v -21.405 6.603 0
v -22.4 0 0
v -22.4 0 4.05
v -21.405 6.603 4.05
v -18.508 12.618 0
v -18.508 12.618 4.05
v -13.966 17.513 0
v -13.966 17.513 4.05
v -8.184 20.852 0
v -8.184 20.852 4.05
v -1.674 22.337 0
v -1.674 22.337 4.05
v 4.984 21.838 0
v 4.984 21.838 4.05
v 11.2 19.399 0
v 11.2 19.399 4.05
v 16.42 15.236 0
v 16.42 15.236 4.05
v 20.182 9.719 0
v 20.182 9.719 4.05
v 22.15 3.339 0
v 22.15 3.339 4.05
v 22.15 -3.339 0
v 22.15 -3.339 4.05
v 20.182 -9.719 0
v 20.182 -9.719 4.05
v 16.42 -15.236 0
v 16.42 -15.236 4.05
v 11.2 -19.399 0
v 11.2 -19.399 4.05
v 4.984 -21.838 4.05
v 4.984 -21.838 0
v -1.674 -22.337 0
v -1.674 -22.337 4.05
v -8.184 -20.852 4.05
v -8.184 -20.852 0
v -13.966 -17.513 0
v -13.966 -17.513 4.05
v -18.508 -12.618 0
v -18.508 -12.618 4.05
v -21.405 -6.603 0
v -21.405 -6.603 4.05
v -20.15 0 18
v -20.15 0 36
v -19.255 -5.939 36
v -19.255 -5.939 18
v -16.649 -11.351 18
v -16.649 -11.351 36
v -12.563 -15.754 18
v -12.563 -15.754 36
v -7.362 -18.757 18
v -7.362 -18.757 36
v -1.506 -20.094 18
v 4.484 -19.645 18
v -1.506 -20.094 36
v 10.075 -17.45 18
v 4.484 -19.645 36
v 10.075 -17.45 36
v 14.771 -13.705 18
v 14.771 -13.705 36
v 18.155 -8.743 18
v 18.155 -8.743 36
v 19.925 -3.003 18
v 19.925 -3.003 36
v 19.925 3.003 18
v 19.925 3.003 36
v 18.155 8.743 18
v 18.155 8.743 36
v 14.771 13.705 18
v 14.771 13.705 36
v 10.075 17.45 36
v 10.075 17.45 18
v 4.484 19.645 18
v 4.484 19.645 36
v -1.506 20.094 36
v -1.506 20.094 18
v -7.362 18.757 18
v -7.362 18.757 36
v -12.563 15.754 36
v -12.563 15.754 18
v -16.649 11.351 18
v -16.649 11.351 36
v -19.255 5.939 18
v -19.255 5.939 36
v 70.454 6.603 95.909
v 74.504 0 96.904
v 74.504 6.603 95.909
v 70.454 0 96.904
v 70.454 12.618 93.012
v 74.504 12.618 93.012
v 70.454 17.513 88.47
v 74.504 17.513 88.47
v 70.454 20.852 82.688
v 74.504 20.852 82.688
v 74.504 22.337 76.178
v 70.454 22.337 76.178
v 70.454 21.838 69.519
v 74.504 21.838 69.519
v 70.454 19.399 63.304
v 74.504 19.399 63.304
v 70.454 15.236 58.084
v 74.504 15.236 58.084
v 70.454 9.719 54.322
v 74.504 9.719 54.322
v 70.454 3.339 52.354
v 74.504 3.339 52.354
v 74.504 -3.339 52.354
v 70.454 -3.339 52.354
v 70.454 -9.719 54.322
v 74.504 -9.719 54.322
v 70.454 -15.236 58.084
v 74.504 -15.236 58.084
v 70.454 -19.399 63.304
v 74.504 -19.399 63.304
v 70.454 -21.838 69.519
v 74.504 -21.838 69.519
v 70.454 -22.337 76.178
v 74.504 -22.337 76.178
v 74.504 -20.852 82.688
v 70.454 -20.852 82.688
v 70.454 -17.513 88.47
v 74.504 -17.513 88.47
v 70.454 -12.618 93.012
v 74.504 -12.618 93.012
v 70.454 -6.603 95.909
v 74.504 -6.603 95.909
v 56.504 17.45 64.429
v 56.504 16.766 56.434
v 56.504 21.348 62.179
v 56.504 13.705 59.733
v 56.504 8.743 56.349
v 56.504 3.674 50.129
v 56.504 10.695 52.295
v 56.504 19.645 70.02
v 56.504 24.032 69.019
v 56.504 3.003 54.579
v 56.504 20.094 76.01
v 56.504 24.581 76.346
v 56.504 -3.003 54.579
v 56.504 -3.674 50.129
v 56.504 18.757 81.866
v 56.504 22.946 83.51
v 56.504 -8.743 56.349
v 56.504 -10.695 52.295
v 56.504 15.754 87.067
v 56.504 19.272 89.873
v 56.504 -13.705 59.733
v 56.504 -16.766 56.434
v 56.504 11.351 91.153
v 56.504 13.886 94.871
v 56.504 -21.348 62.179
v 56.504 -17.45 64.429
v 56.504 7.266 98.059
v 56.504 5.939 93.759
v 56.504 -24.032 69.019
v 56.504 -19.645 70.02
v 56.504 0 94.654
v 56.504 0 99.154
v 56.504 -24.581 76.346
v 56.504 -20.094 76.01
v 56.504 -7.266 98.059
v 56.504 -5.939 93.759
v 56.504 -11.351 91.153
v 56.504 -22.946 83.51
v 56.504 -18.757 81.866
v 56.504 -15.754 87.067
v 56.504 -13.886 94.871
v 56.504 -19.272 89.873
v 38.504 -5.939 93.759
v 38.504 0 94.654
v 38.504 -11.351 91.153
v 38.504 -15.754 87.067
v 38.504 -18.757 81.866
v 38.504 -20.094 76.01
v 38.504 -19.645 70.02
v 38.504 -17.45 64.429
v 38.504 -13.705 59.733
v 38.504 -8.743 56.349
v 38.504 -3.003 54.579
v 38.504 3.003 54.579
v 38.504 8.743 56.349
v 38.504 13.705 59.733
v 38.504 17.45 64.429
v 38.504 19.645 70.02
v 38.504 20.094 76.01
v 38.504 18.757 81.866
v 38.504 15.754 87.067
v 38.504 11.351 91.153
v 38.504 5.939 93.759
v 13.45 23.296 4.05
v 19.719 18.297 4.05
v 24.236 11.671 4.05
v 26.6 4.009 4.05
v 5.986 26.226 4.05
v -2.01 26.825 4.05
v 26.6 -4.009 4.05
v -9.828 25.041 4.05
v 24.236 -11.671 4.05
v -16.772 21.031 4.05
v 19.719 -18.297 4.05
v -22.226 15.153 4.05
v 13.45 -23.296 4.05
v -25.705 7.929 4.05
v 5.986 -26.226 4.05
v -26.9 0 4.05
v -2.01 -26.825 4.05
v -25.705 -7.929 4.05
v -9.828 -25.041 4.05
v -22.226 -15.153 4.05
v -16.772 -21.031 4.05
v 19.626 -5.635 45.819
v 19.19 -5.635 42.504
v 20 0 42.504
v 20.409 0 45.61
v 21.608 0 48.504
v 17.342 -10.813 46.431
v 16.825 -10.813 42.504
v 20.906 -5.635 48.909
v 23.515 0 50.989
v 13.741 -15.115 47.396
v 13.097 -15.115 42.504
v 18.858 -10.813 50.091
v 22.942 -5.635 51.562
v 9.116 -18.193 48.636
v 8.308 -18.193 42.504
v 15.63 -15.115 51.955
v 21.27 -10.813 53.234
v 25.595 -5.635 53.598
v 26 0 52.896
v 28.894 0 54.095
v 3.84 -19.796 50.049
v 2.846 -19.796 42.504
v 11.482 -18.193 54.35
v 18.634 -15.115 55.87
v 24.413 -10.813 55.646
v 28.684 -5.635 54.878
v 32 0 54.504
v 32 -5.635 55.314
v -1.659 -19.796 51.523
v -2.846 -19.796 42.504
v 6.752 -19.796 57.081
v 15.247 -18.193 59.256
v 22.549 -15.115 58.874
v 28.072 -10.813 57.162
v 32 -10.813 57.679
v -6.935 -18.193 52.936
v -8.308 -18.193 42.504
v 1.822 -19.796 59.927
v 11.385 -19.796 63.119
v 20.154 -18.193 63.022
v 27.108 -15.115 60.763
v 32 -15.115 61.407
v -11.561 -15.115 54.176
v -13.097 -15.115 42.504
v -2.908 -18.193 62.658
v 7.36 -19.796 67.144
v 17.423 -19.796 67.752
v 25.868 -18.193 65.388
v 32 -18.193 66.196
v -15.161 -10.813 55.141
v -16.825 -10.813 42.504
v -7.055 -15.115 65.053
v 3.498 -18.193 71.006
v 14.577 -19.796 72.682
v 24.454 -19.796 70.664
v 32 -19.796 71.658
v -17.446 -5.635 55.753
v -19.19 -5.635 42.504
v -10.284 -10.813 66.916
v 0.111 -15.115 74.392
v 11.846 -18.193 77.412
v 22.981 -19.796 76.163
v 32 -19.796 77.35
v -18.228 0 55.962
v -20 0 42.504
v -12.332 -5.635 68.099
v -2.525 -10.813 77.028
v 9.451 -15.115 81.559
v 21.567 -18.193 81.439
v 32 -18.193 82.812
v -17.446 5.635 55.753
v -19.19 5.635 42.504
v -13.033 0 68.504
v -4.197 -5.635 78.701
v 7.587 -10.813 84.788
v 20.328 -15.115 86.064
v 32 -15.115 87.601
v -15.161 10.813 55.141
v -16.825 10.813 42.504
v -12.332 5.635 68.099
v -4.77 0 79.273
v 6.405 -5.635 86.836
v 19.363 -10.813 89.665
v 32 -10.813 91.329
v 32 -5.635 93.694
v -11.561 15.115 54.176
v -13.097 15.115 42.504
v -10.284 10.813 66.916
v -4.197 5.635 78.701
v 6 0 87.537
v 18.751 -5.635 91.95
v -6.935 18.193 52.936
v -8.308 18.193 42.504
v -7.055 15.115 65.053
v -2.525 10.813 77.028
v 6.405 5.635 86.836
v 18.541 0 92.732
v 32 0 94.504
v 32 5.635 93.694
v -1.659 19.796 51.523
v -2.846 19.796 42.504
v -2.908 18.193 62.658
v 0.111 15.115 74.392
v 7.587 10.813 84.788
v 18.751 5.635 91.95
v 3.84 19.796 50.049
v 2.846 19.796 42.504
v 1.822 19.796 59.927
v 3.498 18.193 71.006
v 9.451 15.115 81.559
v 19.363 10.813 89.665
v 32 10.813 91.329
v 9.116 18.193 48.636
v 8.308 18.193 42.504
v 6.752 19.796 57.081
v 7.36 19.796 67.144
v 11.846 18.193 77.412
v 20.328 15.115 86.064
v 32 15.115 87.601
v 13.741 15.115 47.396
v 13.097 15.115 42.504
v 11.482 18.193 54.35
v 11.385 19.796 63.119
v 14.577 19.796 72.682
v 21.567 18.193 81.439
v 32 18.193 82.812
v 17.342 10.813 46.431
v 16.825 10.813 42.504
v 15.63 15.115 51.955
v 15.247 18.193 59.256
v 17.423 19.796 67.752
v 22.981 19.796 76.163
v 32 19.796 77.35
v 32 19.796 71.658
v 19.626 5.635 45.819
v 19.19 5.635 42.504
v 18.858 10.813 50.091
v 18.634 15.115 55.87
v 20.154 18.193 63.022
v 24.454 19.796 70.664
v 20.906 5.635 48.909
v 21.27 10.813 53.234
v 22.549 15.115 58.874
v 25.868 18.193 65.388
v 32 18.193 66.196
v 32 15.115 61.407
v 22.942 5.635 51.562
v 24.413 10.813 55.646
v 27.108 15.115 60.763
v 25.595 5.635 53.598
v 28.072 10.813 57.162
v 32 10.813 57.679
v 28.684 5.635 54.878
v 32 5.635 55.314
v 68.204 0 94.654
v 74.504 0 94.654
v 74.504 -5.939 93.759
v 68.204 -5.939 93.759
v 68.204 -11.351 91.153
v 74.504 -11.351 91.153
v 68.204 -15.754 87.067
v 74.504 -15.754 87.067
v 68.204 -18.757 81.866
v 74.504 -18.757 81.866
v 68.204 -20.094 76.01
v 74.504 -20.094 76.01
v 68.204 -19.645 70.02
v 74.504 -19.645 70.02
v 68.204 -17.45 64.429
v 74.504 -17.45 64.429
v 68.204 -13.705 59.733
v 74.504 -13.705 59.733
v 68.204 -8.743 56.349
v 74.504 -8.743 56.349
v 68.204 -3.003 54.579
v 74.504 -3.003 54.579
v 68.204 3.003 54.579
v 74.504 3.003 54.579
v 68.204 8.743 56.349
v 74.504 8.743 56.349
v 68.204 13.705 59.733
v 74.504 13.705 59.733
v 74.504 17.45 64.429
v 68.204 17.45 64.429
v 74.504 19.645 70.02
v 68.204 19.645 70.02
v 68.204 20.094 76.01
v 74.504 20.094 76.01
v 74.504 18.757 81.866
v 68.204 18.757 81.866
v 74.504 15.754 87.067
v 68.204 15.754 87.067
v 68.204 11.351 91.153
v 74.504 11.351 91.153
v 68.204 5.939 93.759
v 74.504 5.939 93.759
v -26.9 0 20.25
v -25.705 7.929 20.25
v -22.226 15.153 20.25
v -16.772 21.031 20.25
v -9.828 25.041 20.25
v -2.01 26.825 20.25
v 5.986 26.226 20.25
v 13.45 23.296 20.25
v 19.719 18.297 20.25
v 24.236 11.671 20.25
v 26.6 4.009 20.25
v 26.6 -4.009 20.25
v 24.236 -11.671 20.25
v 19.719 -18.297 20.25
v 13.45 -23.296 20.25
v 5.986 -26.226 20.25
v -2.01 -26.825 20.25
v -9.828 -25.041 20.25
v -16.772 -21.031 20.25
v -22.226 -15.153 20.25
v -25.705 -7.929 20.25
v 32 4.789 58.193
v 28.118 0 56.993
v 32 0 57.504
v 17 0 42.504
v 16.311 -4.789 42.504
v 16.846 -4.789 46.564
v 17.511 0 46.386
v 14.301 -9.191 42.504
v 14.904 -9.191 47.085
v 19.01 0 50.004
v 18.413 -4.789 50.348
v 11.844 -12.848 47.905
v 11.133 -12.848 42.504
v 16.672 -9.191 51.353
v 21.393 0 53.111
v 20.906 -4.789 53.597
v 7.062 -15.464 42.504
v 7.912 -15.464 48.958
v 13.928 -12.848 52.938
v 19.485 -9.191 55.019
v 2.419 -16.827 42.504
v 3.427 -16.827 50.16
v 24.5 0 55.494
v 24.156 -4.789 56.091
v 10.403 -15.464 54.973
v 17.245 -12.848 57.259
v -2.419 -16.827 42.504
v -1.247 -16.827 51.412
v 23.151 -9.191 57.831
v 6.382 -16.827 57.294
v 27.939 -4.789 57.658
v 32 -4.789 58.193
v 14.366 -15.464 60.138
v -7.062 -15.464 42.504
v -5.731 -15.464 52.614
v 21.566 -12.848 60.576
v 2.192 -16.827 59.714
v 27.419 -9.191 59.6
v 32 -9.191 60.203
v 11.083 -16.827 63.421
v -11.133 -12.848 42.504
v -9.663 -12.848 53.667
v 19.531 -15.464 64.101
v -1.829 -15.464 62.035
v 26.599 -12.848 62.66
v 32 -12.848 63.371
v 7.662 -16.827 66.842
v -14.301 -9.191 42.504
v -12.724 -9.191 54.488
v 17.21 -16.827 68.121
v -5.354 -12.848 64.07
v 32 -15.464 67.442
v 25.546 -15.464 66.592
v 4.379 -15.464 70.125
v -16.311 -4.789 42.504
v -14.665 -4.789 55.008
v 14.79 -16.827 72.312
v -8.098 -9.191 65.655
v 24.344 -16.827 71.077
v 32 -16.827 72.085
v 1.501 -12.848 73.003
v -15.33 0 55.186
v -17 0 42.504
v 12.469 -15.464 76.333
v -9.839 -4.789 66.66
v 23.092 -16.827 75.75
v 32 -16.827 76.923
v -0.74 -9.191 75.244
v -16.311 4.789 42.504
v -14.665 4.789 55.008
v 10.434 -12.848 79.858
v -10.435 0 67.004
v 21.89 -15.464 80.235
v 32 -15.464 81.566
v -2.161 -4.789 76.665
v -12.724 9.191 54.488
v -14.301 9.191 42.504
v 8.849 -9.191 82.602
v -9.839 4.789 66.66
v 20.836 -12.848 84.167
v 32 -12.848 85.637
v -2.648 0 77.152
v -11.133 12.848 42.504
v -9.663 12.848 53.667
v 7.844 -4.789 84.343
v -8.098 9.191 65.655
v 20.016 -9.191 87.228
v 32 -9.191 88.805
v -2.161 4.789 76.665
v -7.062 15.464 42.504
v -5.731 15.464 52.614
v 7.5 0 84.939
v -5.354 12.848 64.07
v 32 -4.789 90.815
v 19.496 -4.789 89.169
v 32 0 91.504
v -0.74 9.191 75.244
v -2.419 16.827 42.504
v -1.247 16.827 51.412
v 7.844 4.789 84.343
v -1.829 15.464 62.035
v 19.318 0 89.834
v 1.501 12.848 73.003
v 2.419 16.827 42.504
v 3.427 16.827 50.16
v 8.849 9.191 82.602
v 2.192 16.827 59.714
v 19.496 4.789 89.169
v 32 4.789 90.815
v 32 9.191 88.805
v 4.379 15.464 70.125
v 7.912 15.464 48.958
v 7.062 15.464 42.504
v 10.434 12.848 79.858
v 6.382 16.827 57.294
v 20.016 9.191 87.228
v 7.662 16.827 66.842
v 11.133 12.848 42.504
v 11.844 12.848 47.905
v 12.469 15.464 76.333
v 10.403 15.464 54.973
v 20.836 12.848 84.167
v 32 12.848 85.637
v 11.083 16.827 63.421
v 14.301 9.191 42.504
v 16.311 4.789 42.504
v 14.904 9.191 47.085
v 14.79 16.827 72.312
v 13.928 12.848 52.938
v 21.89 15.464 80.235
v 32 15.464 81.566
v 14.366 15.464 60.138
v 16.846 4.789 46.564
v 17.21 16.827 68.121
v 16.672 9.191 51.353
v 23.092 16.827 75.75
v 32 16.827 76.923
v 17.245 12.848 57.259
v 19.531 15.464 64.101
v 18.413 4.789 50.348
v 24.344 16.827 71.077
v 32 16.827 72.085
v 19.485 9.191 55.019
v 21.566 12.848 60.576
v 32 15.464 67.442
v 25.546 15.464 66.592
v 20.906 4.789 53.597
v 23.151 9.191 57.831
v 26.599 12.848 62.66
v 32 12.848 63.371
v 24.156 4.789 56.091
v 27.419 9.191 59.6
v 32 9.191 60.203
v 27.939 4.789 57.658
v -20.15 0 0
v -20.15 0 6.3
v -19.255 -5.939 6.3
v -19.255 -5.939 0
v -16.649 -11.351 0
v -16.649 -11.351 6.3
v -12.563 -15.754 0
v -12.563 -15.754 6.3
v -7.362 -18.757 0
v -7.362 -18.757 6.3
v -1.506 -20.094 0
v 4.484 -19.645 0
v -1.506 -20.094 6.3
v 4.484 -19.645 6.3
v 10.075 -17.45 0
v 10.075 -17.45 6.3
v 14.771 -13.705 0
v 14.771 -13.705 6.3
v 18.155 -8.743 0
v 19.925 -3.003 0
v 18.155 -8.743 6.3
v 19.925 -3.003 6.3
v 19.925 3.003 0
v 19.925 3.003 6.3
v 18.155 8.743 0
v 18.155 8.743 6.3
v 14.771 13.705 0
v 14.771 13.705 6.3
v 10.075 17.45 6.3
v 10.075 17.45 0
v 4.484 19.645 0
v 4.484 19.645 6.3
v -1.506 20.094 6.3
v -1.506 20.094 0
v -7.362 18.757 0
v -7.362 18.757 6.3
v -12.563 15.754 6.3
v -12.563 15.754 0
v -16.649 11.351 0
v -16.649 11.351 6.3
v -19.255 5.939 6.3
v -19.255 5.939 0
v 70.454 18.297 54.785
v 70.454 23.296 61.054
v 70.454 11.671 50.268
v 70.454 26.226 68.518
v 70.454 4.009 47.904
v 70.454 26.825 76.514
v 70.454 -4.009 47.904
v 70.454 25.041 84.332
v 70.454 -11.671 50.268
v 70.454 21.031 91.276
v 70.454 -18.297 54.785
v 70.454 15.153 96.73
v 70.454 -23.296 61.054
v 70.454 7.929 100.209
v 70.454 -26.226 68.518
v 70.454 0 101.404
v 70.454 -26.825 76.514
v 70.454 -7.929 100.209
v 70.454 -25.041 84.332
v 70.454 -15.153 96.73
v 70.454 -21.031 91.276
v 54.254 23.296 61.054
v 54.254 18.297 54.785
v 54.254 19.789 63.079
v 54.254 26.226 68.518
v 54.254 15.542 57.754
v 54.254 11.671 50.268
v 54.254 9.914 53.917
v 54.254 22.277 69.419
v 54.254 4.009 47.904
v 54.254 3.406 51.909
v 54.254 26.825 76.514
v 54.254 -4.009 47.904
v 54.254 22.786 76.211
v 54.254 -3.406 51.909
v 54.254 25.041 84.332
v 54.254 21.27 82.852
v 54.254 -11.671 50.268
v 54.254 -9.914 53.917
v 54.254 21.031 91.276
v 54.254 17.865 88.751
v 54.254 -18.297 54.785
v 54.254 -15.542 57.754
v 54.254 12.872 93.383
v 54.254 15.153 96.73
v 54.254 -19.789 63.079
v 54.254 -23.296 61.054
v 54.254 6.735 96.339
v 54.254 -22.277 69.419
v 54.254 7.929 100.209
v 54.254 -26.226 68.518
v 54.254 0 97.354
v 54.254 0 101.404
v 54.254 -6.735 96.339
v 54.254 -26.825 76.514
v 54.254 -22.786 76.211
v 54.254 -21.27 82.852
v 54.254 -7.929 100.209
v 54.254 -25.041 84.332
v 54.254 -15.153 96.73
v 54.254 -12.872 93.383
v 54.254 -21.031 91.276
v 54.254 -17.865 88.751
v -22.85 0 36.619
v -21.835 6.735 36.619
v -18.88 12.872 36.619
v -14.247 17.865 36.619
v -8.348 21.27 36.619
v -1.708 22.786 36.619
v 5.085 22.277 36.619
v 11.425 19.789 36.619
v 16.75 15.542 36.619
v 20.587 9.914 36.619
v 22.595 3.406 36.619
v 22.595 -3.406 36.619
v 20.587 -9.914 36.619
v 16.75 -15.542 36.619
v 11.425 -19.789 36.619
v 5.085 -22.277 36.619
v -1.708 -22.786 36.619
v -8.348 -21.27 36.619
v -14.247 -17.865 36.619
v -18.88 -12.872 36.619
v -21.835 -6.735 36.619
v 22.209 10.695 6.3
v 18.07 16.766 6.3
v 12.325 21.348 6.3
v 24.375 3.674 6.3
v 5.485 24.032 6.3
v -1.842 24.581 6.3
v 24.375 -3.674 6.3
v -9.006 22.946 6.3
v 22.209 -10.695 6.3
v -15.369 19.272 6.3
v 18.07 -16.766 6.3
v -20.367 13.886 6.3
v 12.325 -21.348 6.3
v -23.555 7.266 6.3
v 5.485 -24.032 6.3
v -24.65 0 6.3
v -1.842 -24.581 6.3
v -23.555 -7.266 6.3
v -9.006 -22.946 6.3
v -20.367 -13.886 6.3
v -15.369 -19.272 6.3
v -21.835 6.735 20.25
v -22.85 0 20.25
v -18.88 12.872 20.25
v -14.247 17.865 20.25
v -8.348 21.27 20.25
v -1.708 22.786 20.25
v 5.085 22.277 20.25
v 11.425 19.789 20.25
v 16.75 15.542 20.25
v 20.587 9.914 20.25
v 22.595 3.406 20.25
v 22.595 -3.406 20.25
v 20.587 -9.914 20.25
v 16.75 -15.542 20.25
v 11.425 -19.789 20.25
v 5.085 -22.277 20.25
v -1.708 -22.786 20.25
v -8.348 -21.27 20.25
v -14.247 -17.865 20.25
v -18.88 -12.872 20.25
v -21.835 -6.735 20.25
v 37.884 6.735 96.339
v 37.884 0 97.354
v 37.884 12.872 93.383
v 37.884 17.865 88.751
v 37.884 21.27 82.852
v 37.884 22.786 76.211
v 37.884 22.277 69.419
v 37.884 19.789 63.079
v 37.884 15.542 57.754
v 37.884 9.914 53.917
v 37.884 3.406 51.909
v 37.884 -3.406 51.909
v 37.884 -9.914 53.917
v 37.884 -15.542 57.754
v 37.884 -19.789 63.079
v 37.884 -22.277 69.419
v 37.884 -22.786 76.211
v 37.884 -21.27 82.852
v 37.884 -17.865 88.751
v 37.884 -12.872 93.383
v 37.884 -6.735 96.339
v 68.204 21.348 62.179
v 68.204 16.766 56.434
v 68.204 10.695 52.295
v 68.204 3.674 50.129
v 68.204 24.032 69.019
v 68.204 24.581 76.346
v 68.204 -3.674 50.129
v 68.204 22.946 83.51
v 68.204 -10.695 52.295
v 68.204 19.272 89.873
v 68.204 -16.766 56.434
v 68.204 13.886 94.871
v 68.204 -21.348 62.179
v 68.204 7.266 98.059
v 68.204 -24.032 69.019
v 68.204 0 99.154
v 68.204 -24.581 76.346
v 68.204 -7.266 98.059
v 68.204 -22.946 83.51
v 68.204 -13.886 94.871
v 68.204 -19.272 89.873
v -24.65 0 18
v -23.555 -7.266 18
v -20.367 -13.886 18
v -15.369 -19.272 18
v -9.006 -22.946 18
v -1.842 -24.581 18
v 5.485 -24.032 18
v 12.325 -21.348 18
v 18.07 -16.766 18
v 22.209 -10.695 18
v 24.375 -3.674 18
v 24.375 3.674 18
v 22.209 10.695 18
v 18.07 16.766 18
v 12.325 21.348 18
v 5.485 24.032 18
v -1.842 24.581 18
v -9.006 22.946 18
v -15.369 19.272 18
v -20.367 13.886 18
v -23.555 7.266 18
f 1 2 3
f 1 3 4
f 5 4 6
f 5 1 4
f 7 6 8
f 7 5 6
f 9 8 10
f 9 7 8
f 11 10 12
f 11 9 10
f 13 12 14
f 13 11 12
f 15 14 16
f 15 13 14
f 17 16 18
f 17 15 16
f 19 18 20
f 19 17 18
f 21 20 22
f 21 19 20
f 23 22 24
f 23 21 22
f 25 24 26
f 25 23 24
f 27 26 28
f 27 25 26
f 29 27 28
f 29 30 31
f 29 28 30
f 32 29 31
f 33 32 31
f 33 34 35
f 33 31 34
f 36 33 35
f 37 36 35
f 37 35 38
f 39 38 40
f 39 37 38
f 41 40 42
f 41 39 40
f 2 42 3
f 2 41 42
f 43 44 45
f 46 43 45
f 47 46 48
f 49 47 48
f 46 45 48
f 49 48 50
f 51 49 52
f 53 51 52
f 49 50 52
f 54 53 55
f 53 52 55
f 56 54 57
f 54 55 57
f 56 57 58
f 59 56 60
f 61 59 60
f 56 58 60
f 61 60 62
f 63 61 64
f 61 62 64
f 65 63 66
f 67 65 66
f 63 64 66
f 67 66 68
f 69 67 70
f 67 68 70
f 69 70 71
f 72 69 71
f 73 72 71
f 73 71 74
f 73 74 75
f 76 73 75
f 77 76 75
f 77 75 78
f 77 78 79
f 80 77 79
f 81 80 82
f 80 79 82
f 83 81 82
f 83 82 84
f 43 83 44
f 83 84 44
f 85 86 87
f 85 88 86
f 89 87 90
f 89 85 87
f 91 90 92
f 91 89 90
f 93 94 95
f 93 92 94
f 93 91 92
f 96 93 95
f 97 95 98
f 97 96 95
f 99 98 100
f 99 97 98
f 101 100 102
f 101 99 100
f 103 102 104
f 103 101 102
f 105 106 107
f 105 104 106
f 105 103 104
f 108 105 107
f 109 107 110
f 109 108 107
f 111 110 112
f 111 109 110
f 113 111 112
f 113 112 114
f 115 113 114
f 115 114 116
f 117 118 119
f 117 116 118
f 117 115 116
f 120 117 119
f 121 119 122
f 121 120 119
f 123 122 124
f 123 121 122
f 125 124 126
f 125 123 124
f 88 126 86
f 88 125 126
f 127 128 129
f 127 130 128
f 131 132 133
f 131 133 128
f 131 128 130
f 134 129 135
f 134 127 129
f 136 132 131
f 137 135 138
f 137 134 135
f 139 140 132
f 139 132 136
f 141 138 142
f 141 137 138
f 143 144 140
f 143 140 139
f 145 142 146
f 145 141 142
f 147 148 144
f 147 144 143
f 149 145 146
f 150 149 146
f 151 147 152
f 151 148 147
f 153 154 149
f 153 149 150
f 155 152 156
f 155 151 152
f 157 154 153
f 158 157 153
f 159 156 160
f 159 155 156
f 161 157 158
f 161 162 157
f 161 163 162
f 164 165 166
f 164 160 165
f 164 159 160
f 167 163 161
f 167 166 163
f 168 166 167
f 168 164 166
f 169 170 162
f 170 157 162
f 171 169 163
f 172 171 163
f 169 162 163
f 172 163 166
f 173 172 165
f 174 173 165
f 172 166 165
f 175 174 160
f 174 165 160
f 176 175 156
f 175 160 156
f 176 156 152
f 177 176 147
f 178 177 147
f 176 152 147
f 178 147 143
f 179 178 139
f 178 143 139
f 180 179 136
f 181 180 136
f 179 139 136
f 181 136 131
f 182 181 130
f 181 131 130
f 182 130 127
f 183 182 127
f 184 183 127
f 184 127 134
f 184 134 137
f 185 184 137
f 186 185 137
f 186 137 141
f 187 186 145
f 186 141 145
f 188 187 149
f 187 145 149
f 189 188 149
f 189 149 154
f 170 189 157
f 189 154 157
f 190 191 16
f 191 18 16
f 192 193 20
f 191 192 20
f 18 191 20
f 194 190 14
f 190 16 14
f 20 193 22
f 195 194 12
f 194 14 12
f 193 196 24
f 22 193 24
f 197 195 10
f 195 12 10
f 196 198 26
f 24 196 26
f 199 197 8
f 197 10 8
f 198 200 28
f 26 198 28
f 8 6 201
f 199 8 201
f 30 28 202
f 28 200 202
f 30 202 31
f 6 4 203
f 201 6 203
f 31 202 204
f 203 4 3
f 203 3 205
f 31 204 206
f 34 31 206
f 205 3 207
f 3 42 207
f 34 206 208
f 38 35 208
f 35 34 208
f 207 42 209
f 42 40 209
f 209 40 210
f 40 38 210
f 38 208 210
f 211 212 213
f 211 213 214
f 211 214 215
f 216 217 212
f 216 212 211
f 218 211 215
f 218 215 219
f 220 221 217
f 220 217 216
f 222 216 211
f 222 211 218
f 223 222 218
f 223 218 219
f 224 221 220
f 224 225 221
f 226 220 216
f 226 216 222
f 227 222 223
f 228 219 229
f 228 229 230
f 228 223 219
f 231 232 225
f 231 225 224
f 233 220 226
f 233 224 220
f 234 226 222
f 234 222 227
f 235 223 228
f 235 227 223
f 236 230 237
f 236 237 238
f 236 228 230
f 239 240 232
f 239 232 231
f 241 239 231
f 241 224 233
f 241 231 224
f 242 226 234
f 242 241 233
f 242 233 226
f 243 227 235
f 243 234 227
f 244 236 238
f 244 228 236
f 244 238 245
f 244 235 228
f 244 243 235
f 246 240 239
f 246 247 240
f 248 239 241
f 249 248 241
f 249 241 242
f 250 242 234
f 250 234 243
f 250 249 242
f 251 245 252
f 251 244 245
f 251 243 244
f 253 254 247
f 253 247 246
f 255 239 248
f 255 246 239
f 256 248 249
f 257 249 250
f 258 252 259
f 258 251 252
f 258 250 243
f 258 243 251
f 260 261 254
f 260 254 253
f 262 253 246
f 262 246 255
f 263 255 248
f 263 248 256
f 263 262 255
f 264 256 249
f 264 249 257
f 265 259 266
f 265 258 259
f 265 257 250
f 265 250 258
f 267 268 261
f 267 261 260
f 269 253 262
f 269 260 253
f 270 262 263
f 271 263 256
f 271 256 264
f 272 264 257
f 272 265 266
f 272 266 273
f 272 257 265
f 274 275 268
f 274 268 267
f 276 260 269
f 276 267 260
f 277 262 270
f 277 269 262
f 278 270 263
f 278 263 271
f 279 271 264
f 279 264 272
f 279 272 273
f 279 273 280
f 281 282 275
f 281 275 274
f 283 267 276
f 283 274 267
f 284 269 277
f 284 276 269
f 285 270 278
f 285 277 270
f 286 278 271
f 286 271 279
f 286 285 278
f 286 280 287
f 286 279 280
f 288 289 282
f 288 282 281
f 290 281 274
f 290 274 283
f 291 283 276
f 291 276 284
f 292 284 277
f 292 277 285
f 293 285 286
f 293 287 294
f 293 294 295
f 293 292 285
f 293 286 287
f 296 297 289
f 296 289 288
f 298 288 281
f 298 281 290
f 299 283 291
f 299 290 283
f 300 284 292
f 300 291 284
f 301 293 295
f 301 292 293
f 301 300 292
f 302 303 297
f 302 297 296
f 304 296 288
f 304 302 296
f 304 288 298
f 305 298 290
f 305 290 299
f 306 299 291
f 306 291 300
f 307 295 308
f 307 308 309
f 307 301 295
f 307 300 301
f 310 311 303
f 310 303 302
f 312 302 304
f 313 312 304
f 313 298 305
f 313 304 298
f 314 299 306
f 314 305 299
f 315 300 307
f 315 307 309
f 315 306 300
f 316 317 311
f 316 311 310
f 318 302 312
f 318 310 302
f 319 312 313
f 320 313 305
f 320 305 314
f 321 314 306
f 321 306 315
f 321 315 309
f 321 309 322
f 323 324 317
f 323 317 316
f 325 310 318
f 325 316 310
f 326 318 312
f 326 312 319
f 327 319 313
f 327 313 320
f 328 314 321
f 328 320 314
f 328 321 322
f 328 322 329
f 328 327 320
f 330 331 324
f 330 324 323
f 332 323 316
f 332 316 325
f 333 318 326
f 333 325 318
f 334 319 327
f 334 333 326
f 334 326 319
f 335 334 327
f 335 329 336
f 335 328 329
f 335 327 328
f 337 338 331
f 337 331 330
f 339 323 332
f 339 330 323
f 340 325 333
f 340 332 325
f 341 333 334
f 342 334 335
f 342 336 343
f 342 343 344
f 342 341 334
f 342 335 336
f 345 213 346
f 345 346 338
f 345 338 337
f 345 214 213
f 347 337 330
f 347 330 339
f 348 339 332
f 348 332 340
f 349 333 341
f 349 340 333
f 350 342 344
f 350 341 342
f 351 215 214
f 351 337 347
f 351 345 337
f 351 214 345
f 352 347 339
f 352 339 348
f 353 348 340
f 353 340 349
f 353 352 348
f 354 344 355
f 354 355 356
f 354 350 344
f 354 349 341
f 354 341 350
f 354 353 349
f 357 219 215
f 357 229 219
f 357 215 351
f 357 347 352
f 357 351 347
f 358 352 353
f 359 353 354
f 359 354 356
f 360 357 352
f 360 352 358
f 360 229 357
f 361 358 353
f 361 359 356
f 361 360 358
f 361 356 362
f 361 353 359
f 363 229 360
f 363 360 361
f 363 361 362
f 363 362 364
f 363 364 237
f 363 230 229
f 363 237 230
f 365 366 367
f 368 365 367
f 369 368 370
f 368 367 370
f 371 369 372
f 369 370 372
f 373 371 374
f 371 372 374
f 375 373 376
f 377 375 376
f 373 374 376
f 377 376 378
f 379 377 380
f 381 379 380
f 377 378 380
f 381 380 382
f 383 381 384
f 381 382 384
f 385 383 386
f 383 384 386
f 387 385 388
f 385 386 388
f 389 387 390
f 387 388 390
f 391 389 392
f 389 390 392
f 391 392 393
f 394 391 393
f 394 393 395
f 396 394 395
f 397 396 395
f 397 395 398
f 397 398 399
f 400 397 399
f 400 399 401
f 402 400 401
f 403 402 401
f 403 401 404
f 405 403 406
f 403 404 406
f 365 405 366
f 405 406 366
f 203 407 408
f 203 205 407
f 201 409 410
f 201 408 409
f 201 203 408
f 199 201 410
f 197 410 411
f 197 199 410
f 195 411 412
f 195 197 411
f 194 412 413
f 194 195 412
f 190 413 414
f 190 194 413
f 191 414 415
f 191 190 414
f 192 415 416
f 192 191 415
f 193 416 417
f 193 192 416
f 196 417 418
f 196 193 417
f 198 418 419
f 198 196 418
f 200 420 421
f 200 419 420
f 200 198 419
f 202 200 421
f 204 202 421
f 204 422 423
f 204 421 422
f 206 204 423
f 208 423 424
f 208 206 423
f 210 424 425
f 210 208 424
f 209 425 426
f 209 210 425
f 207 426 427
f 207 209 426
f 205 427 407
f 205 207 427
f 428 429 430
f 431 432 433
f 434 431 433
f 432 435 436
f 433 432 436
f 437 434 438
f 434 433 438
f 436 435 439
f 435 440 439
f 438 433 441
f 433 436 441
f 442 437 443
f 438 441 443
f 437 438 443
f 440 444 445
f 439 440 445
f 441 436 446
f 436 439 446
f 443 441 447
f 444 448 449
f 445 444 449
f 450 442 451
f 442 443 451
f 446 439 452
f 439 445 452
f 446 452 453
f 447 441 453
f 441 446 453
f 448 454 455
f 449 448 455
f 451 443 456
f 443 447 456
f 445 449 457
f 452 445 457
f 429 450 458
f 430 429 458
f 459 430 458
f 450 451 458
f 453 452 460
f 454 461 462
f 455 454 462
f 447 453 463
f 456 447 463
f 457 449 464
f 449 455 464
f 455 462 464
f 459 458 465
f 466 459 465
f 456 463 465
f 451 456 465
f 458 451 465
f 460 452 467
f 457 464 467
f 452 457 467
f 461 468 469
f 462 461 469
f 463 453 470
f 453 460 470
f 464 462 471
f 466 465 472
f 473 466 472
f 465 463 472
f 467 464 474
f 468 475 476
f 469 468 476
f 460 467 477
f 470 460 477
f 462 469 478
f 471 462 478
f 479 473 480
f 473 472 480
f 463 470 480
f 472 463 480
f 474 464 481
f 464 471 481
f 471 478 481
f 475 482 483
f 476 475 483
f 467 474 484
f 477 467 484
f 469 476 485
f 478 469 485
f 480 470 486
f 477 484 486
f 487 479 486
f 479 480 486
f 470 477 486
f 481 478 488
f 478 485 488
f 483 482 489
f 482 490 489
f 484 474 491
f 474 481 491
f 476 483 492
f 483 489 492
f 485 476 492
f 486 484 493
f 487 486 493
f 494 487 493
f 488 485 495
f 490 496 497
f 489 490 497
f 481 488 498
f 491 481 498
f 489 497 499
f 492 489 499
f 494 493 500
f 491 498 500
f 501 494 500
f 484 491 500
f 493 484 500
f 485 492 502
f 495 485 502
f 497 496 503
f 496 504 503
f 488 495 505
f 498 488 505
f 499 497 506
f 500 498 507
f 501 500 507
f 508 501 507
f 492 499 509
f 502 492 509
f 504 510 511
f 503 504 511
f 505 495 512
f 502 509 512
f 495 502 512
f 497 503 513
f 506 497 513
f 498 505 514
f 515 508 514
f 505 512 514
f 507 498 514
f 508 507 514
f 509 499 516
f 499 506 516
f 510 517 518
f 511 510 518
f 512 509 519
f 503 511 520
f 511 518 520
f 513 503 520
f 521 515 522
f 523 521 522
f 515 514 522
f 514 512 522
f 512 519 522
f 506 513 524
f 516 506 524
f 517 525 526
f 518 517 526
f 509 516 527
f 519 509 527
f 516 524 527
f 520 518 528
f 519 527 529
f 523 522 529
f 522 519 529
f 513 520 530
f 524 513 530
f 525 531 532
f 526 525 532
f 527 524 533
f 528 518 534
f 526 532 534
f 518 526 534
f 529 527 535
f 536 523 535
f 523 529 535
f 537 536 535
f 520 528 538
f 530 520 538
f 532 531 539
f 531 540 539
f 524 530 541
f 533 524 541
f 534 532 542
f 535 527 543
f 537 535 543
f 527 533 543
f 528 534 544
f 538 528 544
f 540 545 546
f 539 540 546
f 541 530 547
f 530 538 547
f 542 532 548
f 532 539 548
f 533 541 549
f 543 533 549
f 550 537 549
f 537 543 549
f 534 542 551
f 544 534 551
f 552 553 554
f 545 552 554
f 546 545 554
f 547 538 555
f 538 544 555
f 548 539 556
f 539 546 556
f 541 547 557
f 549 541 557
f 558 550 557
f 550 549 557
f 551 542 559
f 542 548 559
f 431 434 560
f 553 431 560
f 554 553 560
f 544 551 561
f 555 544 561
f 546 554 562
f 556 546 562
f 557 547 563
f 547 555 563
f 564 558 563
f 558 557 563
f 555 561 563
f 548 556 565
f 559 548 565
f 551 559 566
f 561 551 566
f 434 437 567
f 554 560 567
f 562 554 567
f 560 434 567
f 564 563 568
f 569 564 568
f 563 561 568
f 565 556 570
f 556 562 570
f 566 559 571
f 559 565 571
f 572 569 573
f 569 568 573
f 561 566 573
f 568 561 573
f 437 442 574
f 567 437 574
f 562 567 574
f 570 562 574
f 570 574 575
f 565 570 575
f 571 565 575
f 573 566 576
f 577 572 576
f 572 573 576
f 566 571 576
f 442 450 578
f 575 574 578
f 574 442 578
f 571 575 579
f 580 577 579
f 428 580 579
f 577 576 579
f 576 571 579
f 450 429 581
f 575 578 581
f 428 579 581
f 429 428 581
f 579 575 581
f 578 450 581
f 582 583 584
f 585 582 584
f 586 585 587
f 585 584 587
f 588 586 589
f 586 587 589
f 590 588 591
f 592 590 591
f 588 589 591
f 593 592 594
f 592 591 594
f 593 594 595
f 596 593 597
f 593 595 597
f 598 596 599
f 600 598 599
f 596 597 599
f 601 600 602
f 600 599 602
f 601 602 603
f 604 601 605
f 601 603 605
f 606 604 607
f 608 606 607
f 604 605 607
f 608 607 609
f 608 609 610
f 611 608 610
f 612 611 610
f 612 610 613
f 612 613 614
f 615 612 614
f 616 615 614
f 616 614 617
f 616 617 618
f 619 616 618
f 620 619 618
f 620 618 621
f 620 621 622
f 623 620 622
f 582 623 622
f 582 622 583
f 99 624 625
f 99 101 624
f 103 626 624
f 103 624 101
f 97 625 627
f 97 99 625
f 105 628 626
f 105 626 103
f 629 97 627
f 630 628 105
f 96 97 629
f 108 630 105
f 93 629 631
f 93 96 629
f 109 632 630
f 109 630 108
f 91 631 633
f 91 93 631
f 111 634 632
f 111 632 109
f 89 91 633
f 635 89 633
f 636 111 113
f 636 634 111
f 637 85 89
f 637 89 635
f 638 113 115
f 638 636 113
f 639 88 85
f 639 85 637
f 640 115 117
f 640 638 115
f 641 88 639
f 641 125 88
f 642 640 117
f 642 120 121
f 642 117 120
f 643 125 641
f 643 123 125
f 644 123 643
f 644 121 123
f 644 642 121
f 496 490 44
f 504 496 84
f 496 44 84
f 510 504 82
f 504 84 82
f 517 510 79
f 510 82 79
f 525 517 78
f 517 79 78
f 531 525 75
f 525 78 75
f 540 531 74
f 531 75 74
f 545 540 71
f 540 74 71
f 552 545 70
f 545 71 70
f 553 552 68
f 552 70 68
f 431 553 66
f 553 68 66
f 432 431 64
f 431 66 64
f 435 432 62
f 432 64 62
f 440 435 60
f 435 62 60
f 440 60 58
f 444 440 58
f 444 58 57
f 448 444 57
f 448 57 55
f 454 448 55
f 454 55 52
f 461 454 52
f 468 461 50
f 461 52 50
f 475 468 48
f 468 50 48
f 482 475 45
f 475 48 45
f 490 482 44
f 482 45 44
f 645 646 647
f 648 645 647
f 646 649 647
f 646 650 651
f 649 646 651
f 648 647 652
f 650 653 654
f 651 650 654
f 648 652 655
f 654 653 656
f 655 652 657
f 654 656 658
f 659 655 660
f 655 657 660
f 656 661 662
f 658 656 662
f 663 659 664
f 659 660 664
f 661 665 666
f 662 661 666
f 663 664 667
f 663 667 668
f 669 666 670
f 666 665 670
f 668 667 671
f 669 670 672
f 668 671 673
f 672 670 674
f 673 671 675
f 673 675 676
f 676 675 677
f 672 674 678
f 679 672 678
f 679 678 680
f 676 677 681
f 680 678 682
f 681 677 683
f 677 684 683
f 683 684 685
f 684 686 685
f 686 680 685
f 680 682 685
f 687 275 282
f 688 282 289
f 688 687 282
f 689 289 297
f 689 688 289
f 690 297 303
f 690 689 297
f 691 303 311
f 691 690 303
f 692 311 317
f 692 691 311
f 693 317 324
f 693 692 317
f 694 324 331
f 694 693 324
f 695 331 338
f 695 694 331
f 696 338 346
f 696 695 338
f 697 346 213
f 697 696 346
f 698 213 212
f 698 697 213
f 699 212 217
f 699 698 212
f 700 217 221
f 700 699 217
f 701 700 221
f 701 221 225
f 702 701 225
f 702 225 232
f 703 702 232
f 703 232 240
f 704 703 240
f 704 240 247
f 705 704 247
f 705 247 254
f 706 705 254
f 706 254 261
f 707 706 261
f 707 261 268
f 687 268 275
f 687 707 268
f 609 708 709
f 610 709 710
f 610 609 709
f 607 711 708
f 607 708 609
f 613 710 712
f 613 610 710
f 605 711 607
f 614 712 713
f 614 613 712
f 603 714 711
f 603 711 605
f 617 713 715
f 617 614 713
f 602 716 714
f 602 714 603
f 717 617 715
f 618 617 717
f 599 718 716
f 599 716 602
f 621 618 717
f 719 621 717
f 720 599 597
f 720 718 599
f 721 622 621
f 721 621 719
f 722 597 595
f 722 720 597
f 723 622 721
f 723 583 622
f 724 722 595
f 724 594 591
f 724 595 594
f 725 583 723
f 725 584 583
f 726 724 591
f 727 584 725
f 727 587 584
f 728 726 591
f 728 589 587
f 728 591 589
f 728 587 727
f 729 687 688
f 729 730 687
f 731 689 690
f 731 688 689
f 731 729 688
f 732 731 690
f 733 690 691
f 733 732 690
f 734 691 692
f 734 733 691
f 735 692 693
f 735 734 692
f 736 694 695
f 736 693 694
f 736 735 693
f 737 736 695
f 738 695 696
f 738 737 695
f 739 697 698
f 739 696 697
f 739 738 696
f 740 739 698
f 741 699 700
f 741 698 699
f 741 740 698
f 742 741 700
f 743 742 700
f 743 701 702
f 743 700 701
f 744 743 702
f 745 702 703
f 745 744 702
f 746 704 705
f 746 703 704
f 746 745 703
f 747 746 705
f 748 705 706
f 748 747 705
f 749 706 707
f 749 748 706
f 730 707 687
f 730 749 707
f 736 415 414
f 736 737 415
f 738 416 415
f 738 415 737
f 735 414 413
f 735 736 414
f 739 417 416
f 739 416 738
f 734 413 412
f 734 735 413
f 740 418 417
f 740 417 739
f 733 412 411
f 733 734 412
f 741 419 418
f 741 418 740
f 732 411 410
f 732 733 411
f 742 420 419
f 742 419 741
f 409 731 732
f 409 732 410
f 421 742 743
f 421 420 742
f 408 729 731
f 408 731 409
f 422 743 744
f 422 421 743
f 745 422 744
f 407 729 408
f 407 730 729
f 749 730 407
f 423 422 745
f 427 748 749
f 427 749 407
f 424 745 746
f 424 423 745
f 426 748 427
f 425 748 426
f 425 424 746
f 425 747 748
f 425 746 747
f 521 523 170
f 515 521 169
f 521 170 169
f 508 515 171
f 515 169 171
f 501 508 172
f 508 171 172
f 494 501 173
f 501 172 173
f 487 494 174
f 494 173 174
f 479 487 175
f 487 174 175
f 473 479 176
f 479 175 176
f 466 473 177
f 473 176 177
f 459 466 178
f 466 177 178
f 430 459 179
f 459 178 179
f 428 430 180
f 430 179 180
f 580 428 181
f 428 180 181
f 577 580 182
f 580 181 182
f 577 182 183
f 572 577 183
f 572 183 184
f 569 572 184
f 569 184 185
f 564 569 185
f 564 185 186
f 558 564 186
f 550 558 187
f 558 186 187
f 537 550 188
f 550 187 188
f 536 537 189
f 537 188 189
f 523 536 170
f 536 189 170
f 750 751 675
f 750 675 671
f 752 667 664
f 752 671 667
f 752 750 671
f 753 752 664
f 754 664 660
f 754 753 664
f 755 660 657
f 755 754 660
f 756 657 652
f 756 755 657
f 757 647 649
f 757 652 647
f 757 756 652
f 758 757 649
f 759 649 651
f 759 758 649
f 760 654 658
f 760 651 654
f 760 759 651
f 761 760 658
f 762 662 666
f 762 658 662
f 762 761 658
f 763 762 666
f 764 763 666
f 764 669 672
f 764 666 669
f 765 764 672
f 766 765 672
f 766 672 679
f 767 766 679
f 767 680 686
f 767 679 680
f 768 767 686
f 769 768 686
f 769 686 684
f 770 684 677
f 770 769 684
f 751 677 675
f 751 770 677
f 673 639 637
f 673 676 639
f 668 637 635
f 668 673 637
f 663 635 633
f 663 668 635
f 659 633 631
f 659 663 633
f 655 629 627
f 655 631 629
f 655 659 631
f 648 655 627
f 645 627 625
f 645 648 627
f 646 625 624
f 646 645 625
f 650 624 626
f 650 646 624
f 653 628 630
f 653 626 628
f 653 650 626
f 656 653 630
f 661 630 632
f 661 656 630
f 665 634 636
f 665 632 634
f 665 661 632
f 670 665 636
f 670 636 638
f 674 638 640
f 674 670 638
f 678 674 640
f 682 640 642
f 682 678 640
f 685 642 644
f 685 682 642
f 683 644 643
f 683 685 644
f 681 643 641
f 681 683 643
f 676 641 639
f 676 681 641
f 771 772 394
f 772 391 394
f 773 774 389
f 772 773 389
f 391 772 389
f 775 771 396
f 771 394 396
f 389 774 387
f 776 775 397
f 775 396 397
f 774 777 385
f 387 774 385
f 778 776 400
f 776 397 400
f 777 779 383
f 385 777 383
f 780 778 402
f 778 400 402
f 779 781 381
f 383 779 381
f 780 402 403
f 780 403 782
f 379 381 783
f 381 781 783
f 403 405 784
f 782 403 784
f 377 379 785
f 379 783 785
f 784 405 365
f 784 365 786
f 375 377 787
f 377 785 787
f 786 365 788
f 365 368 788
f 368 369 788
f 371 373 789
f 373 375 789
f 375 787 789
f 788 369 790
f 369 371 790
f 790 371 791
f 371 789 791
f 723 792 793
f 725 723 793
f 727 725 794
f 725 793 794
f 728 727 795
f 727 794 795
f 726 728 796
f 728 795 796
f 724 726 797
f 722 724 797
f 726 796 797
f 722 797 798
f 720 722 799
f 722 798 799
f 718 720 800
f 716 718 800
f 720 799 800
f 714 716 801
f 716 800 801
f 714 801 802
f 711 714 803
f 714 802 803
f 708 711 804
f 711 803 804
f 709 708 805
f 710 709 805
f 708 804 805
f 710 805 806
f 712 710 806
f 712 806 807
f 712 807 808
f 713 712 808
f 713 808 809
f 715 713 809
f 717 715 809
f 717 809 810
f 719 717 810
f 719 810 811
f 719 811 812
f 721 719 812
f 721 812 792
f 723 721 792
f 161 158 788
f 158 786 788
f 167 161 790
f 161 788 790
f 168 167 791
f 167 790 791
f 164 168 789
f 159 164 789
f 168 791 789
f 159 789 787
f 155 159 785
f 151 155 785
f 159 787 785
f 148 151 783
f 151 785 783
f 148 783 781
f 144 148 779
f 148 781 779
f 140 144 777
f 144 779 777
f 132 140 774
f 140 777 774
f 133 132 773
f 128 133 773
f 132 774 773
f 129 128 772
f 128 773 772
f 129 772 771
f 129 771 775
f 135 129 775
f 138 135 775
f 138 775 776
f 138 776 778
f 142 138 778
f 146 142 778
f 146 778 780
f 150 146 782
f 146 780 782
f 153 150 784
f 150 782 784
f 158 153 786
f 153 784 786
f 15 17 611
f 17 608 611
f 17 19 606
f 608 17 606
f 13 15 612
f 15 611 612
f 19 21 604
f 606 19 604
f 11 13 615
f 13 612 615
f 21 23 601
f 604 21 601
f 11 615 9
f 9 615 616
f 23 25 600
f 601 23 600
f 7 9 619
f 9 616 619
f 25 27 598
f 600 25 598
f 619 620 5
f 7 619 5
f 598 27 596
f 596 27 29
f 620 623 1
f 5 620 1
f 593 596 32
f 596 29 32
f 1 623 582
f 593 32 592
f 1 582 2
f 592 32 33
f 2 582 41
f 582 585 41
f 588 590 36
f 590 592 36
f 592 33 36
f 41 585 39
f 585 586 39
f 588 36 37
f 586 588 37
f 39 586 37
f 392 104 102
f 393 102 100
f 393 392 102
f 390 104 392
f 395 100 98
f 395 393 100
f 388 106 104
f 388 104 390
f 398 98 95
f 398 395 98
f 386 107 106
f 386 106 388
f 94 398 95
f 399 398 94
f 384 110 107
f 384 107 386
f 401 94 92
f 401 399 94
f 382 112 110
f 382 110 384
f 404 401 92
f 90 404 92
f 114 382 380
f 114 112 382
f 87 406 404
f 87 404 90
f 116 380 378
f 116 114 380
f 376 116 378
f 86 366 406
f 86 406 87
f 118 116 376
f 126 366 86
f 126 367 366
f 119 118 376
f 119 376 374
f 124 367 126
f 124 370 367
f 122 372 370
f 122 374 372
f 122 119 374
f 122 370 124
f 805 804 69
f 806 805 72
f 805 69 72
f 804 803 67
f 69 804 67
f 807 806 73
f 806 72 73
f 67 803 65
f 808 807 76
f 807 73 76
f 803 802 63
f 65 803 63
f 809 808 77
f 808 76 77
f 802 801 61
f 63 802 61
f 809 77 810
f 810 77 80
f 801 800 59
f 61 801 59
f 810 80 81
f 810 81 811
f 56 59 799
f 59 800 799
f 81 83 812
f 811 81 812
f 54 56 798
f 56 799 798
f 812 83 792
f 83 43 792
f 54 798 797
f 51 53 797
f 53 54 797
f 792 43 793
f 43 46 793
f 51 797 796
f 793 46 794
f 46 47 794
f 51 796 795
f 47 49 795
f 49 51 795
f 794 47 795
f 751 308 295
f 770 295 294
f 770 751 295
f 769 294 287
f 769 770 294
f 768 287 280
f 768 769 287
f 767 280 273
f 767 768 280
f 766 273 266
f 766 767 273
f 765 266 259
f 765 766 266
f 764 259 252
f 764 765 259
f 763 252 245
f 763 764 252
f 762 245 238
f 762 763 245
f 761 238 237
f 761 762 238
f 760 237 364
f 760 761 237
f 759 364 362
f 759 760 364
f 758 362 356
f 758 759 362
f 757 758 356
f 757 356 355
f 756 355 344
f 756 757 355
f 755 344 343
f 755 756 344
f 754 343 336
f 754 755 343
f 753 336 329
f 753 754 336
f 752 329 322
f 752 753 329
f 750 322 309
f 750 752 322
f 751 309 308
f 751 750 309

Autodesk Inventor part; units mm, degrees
ref_plane "YZ Plane" through (0, 0, 0) normal (1, 0, 0) x (0, 1, 0)
ref_plane "XZ Plane" through (0, 0, 0) normal (0, 1, 0) x (-1, 0, 0)
ref_plane "XY Plane" through (0, 0, 0) normal (0, 0, 1) x (1, 0, 0)
sketch "Sketch1" plane through (0, 0, 0) normal (0, 1, 0) x (-1, 0, 0)
  line L0 (0, 0) -> (0, 42.5039)
  line L1 (17, 42.5039) -> (20, 42.5039)
  line L2 (0, 42.5039) -> (17, 42.5039) construction
  line L3 (20, 42.5039) -> (22.85, 36.6194)
  line L4 (22.85, 20.25) -> (26.9, 20.25)
  line L5 (26.9, 20.25) -> (26.9, 4.05)
  line L6 (26.9, 4.05) -> (22.4, 4.05)
  line L7 (22.4, 4.05) -> (22.4, 0)
  line L8 (22.4, 0) -> (20.15, 0)
  line L9 (20.15, 0) -> (20.15, 6.3)
  line L10 (20.15, 6.3) -> (24.65, 6.3)
  line L11 (24.65, 6.3) -> (24.65, 18)
  line L12 (24.65, 18) -> (20.15, 18)
  line L13 (20.15, 18) -> (20.15, 36)
  line L14 (20.15, 36) -> (17, 42.5039)
  line L15 (20.15, 0) -> (0, 0) construction
  line L16 (22.85, 36.6194) -> (22.85, 20.25)
  line L17 (0, 42.5039) -> (0, 74.5039) construction
  line L18 (0, 74.5039) -> (-32, 74.5039) construction
  line L19 (-32, 74.5039) -> (-74.5039, 74.5039) construction
  line L20 (-74.5039, 74.5039) -> (-74.5039, 94.6539) construction
  line L21 (-74.5039, 94.6539) -> (-74.5039, 96.9039)
  line L22 (-74.5039, 96.9039) -> (-70.4539, 96.9039)
  line L23 (-70.4539, 96.9039) -> (-70.4539, 101.4039)
  line L24 (-70.4539, 101.4039) -> (-54.2539, 101.4039)
  line L25 (-54.2539, 101.4039) -> (-54.2539, 97.3539)
  line L26 (-54.2539, 97.3539) -> (-37.8845, 97.3539)
  line L27 (-37.8845, 97.3539) -> (-32, 94.5039)
  line L28 (-32, 94.5039) -> (-32, 91.5039)
  line L29 (-32, 91.5039) -> (-38.5039, 94.6539)
  line L30 (-38.5039, 94.6539) -> (-56.5039, 94.6539)
  line L31 (-56.5039, 94.6539) -> (-56.5039, 99.1539)
  line L32 (-56.5039, 99.1539) -> (-68.2039, 99.1539)
  line L33 (-68.2039, 99.1539) -> (-68.2039, 94.6539)
  line L34 (-68.2039, 94.6539) -> (-74.5039, 94.6539)
  line L35 (-32, 91.5039) -> (-32, 74.5039) construction
  line L36 (20.15, 36) -> (0, 36) construction
  line L37 (-38.5039, 94.6539) -> (-38.5039, 74.5039) construction
  dimension "d0" = 2.25
  dimension "d1" = 2.25
  dimension "d2" = 2.25
  dimension "d4" = 2.7
  dimension "d5" = 2.25
  dimension "d6" = 6.75
  dimension "d7" = 40.3
  dimension "d8" = 18
  dimension "d9" = 18
  dimension "d11" = 6.3
  dimension "d12" = 40
  dimension "d13" = 3
  dimension "d14" = 2.7
  dimension "d17" = 40.3
  dimension "d18" = 2.25
  dimension "d19" = 2.25
  dimension "d20" = 2.25
  dimension "d21" = 2.25
  dimension "d22" = 4.5
  dimension "d23" = 2.7
  dimension "d24" = 3
  dimension "d25" = 40
  dimension "d26" = 6.3
  dimension "d27" = 18
  dimension "d28" = 18
  dimension "d29" = 32
  dimension "d30" = 32
  dimension "d31" = 2.7
revolve "Revolution1" add sketch "Sketch1" angle 360 about axis through (0, 0, 0) along (0, 0, 1) contours L1 L3 L16 L4 L5 L6 L7 L8 L9 L10 L11 L12 L13 L14
sketch "Sketch2" plane through (0, 0, 42.5039) normal (0, 0, 1) x (1, 0, 0)
  circle A0 centre (0, 0) radius 20 projected
  circle A1 centre (0, 0) radius 20
  circle A2 centre (0, 0) radius 17
  circle A3 centre (0, 0) radius 17 projected
sketch "Sketch3" plane through (0, 0, 0) normal (0, 1, 0) x (-1, 0, 0)
  line L0 (-20, 42.5039) -> (20, 42.5039) projected
  line L1 (0, 42.5039) -> (0, 74.5039) construction
  line L2 (0, 74.5039) -> (-32, 74.5039) construction
  arc A0 (0, 42.5039) -> (-32, 74.5039) centre (-32, 42.5039) ccw
  dimension "d15" = 32
  dimension "d16" = 32
sweep "Sweep1" add profiles "Sketch2" path "Sketch3" path curves A0
revolve "Revolution2" add sketch "Sketch1" angle 360 about axis through (32, 0, 74.5039) along (1, 0, 0) contours L21 L22 L23 L24 L25 L26 L27 L28 L29 L30 L31 L32 L33 L34
equation "\"d0\" = e3"
equation "\"d1\" = e3"
equation "\"d2\" = e3"
equation "\"d4\" = e2"
equation "\"d5\" = e3"
equation "\"d6\" = 3 * e3"
equation "\"d7\" = Ds"
equation "\"d8\" = C1"
equation "\"d9\" = A"
equation "\"d11\" = 0.35 * C1"
equation "\"d12\" = De"
equation "\"d13\" = e"
equation "\"d14\" = e2"
equation "\"d17\" = Ds"
equation "\"d18\" = e3"
equation "\"d19\" = e3"
equation "\"d20\" = e3"
equation "\"d21\" = e3"
equation "\"d22\" = 2 * e3"
equation "\"d23\" = e2"
equation "\"d24\" = e"
equation "\"d25\" = De"
equation "\"d26\" = 0.35 * C1"
equation "\"d27\" = C1"
equation "\"d28\" = A"
equation "\"d29\" = z"
equation "\"d30\" = z"
equation "\"d31\" = e2"
equation "\"d15\" = z"
equation "\"d16\" = z"
equation "\"z\" = 32"
equation "\"De\" = 40"
equation "\"e\" = 3"
equation "\"Ds\" = 40.3"
equation "\"e2\" = 0.9 * e"
equation "\"C1\" = 18"
equation "\"e3\" = 0.75 * e"
equation "\"A\" = 18"
equation "\"Size_Designation\" = 1.2345"
properties part number "ISO 3633 Изгиб 90 с раструбом только для соединений с эластомерными уплотнительными кольцами DN40" material "ПВХ, непластифицированный"
